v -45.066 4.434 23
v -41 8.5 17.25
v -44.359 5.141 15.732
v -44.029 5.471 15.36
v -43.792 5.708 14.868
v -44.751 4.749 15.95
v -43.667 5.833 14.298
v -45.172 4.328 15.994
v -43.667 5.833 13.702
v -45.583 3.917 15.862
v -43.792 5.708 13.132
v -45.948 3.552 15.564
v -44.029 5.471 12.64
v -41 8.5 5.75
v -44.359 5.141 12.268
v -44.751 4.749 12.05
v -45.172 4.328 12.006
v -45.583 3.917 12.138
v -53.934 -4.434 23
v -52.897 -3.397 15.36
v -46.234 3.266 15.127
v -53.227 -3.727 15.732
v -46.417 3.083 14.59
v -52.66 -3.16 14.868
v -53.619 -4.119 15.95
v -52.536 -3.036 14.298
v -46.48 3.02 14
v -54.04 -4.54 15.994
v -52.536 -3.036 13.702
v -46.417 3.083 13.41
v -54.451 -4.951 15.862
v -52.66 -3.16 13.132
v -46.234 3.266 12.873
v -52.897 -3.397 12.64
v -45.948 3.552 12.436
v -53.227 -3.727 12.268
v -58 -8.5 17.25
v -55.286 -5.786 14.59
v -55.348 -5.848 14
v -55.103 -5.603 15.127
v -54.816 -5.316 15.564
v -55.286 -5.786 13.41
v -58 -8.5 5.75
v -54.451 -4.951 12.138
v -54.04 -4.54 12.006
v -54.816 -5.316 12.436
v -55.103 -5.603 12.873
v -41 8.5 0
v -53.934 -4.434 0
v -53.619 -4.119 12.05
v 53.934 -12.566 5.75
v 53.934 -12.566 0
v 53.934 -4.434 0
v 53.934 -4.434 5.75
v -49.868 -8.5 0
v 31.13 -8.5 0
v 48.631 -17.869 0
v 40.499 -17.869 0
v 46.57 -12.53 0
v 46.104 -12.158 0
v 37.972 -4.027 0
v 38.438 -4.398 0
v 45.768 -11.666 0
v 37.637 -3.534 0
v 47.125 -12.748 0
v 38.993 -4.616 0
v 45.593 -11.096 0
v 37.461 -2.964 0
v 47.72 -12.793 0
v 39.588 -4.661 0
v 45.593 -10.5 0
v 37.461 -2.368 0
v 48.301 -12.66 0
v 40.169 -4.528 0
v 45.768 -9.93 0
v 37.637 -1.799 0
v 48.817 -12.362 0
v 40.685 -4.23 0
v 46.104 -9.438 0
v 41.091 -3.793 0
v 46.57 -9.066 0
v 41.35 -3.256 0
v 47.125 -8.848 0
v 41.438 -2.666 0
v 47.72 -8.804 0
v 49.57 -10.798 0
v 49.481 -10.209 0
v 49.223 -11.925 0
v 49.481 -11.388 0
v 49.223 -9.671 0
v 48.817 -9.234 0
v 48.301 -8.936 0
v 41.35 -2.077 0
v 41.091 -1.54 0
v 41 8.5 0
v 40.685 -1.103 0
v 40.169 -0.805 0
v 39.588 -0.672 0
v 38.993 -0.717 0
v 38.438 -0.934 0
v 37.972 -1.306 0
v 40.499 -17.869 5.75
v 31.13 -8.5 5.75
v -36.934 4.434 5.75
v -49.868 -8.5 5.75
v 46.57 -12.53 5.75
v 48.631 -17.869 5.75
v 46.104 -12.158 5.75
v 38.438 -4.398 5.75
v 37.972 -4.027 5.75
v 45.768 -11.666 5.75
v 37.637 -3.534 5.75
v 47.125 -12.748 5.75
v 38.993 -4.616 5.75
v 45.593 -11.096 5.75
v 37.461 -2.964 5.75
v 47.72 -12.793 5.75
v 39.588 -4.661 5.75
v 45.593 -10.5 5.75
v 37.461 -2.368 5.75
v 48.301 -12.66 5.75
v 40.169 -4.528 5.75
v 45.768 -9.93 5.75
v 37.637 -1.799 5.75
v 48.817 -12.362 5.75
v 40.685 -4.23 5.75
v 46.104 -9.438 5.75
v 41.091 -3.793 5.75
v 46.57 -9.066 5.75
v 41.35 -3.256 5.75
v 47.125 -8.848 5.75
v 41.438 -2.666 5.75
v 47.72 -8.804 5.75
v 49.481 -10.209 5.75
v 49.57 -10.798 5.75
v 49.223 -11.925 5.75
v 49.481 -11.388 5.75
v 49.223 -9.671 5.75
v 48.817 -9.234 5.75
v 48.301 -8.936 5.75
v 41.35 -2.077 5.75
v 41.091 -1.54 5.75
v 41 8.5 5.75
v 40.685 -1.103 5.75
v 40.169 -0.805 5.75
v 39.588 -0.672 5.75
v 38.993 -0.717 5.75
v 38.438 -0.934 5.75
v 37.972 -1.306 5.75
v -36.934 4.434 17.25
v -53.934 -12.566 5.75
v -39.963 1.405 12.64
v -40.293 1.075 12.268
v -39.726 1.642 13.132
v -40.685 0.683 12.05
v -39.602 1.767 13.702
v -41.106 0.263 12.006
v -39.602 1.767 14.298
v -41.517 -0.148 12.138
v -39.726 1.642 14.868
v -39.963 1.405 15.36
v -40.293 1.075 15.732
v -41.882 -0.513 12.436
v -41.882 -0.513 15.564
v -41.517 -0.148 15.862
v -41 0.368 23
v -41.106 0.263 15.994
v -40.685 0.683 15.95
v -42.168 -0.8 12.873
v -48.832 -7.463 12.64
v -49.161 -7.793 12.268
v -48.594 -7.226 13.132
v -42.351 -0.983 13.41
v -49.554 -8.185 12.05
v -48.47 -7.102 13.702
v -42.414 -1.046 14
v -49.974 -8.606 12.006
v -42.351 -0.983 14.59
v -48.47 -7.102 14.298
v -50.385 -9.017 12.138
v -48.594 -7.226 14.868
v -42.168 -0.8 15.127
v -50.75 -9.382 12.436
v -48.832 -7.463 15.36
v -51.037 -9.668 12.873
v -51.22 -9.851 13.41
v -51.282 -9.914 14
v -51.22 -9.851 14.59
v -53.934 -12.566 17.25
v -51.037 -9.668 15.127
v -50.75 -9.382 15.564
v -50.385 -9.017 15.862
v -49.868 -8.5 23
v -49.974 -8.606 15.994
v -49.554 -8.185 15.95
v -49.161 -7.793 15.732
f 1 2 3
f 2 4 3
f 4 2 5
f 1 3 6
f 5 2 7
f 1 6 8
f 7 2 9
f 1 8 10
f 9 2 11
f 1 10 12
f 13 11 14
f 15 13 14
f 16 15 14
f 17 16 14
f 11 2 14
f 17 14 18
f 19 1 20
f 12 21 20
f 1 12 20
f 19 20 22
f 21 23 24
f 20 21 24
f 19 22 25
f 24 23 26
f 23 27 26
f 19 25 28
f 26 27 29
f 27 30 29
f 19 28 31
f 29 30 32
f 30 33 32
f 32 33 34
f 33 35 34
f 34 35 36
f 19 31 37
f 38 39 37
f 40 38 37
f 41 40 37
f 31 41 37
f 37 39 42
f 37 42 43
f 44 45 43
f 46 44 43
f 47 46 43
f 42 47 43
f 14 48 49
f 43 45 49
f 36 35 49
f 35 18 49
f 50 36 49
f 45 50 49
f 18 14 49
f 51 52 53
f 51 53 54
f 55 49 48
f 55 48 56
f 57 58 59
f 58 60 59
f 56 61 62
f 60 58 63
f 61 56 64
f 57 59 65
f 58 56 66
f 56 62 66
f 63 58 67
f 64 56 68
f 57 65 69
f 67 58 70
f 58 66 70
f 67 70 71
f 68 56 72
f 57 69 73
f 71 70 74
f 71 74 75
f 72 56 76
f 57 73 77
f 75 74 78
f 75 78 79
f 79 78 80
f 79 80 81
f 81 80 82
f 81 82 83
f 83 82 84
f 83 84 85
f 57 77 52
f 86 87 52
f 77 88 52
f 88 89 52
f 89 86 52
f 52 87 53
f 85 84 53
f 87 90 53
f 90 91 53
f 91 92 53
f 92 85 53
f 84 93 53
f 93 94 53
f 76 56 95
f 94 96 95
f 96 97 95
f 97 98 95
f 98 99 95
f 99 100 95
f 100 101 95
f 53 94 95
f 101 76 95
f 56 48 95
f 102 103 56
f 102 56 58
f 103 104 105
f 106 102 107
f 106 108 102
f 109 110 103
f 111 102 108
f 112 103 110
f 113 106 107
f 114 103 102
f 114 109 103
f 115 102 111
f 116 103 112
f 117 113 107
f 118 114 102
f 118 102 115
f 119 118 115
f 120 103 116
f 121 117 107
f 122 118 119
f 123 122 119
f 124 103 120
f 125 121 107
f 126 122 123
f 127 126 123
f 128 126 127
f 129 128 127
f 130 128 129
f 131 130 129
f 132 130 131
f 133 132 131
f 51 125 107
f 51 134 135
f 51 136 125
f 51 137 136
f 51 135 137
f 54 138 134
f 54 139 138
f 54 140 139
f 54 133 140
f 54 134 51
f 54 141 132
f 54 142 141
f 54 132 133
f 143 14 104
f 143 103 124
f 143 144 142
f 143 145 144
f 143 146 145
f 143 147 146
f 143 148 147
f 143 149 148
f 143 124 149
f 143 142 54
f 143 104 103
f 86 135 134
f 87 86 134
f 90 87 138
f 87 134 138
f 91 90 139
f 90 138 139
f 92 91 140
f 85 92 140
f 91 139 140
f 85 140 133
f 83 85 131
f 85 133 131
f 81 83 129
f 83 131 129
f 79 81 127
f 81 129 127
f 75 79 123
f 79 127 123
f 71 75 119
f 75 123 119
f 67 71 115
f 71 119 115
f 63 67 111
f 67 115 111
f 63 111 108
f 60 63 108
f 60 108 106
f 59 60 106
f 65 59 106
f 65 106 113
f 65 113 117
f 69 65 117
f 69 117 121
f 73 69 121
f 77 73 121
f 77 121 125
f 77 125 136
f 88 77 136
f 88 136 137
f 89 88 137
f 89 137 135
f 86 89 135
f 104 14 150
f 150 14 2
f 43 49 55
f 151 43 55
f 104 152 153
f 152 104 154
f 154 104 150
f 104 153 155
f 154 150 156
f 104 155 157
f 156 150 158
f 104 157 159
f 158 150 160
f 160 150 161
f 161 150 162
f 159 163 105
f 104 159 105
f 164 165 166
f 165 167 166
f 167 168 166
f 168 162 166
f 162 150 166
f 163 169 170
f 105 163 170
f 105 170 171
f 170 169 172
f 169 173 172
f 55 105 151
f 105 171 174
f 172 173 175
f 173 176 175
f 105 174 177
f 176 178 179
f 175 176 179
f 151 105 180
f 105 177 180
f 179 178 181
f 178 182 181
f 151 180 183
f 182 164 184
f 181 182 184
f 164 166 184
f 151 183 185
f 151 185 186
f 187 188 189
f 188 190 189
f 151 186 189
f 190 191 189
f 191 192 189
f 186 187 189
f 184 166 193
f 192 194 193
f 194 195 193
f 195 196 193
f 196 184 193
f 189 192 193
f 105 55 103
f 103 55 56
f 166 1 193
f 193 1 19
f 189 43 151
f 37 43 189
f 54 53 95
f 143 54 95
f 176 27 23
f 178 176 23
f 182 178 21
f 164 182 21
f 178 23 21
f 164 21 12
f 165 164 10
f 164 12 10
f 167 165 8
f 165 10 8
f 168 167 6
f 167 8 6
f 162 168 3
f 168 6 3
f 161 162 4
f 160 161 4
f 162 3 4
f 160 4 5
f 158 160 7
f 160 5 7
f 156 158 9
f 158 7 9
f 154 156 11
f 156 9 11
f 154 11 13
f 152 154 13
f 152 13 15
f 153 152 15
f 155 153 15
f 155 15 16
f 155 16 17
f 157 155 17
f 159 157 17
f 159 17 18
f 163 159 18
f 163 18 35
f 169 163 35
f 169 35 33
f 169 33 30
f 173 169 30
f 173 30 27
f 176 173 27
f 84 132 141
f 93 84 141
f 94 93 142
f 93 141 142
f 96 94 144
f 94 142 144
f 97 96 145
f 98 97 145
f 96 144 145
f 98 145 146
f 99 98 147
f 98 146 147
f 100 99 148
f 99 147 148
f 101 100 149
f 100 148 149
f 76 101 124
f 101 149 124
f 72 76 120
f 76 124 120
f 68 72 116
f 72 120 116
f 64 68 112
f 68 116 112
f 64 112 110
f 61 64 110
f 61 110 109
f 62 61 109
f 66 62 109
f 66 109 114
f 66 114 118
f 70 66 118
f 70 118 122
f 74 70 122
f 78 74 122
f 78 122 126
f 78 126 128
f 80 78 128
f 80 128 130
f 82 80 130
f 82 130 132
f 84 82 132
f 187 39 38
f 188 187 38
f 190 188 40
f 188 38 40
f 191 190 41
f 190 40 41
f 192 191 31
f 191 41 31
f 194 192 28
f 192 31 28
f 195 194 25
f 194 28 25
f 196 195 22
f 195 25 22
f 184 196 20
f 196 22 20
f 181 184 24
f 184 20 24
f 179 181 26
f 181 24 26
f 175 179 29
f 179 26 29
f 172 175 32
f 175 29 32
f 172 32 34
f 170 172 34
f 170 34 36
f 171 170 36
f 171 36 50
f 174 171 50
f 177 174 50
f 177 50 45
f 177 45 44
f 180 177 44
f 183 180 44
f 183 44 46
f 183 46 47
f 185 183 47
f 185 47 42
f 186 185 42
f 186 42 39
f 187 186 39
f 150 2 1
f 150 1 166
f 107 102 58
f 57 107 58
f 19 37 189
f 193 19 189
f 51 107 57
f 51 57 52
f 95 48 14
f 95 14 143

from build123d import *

# Parameters (mm, degrees)
F0_W      = 82
F0_H      = 17
F1_DEPTH  = 5.75
F2_W      = 24.0416305603
F2_H      = 23
F3_DEPTH  = 5.75
F4_R      = 2
F5_DEPTH  = 25
F6_SIZE   = 5.75
F8_DEPTH  = 5.75
F9_R      = 2
F10_DEPTH = 25
F11_SIZE  = 5.75


with BuildPart() as f1:
    # F0 (on Top) → F1 (new body)
    with BuildSketch(Plane.XY):
        Rectangle(F0_W, F0_H)
        Polygon((41, 8.5), (41, -8.5), (58, -8.5), align=None)
        Polygon((-58, -8.5), (-41, -8.5), (-41, 8.5), align=None)
    extrude(amount=F1_DEPTH)

    # F2 (on face) → F3 (join)
    with BuildSketch(Plane(origin=(-24.75, 24.75, 0), x_dir=(-0.7071067812, -0.7071067812, 0), z_dir=(-0.7071067812, 0.7071067812, 0))):
        with Locations((35.0017856687, 11.5)):
            Rectangle(F2_W, F2_H)
    extrude(amount=-F3_DEPTH)

    # F4 (on face) → F5 (cut)
    with BuildSketch(Plane(origin=(-24.75, 24.75, 0), x_dir=(-0.7071067812, -0.7071067812, 0), z_dir=(-0.7071067812, 0.7071067812, 0))):
        with Locations((28.7309703886, 14)):
            Circle(F4_R)
        with Locations((41.2726009489, 14)):
            Circle(F4_R)
    extrude(amount=-F5_DEPTH, mode=Mode.SUBTRACT)

    # F6
    f6_edges = [f1.edges().sort_by_distance(p)[0] for p in [
        (-55.967068, -10.532932, 23),
        (-38.967068, 6.467068, 23),
        (-55.967068, -10.532932, 0),
    ]]
    chamfer(f6_edges, length=F6_SIZE)

    # F7 (on face) → F8 (join)
    with BuildSketch(Plane.XY.offset(5.75)):
        Polygon((58, -8.5), (41, 8.5), (28.3015151902, -5.6715728753), (31.1299423149, -8.5), align=None)
        Polygon((44.5649711575, -21.9350288425), (58, -8.5), (31.1299423149, -8.5), align=None)
    extrude(amount=-F8_DEPTH)

    # F9 (on face) → F10 (cut)
    with BuildSketch(Plane.XY.offset(5.75)):
        with Locations((47.5701749775, -10.7980970389)):
            Circle(F9_R)
        with Locations((39.4384469939, -2.6663690552)):
            Circle(F9_R)
    extrude(amount=-F10_DEPTH, mode=Mode.SUBTRACT)

    # F11
    f11_edges = [f1.edges().sort_by_distance(p)[0] for p in [
        (44.564971, -21.935029, 2.875),
        (58, -8.5, 2.875),
    ]]
    chamfer(f11_edges, length=F11_SIZE)


solid = f1.part
